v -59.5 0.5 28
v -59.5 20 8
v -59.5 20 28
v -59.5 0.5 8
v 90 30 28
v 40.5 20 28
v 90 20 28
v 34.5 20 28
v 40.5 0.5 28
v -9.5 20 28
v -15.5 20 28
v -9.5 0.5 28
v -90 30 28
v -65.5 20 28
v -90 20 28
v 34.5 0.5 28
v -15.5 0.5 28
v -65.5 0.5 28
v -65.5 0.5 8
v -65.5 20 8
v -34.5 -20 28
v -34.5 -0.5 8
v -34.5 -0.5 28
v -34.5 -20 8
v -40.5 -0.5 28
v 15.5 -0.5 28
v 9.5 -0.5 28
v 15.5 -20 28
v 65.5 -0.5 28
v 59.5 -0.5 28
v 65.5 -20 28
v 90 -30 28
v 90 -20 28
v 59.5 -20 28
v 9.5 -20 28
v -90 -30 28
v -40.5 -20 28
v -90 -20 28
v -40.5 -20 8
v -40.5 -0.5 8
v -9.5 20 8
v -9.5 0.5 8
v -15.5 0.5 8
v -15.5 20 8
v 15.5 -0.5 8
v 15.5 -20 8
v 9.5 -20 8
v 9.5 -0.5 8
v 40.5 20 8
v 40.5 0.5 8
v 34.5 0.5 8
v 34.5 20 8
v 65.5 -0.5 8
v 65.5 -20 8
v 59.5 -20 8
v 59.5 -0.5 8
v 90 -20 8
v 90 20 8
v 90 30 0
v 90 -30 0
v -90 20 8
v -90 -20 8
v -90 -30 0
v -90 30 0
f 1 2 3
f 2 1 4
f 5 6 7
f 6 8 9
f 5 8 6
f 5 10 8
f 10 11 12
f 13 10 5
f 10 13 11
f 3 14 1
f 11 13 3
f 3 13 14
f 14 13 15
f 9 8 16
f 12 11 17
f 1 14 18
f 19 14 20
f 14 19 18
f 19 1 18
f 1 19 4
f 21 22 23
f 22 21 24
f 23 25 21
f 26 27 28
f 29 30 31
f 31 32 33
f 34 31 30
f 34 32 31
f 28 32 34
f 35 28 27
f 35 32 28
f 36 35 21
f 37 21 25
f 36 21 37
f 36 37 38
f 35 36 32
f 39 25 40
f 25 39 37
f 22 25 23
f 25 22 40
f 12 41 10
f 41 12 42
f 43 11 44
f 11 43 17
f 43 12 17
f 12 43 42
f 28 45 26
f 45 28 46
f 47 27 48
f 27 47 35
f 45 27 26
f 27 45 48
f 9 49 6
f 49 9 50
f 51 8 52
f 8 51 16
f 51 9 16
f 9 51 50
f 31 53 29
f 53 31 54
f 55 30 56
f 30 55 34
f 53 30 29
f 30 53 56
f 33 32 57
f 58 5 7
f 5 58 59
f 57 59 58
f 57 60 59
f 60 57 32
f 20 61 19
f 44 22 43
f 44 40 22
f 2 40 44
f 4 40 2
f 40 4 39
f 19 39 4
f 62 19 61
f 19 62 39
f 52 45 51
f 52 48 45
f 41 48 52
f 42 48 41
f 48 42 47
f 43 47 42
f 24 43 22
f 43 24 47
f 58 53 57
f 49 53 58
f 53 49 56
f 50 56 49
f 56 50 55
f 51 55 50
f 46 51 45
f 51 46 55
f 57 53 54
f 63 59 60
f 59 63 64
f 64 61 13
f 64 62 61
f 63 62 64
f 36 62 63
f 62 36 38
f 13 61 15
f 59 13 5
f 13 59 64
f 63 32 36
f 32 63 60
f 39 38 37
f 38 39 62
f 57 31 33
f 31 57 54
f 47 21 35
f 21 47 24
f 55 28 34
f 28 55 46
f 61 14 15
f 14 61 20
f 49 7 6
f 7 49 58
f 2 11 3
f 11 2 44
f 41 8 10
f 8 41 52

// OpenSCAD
$fn = 32;

// ----------------------------------------------------------------------
// Rib frame 180 x 60 x 28
// 6 ribs at 25 mm pitch, staggered
// ----------------------------------------------------------------------

// --- parameters (mm) ---
frame = [180, 60, 8];  // base plate size (x, y, z)
seat_tol = 0.1;        // tolerance at the seating features
free_tol = 0.3;        // general tolerance on the free sizes
rail_w = 10;           // side rail width
ribs = 6;              // number of ribs
rib_t = 6;             // rib thickness
rib_h = 20;            // rib height above the base plate
pitch = 25;            // pitch between rib centres

// --- derived feature positions (mm) ---
span = (ribs - 1) * pitch;          // = 125   distance between the outer ribs
origin_x = -span / 2;               // = -62.5   X of the first rib
rib_len = frame[1] / 2 - rail_w + 0.5;  // = 20.5   length of a staggered rib
rib_y = 0.5 + rib_len / 2;          // = 10.75   Y of a staggered rib centre
row_offset = 2 * rib_y;             // = 21.5   distance between the two rows
feature_centers = [
  [origin_x + 0 * pitch, rib_y],
  [origin_x + 1 * pitch, -rib_y],
  [origin_x + 2 * pitch, rib_y],
  [origin_x + 3 * pitch, -rib_y],
  [origin_x + 4 * pitch, rib_y],
  [origin_x + 5 * pitch, -rib_y]
];   // rib centre line, drives the rib loop

// base plate, two side rails, then the ribs read straight off feature_centers
union() {
  translate([-frame[0] / 2, -frame[1] / 2, 0]) cube(frame);
  translate([-frame[0] / 2, -frame[1] / 2, 0]) cube([frame[0], rail_w, frame[2] + rib_h]);
  translate([-frame[0] / 2, frame[1] / 2 - rail_w, 0]) cube([frame[0], rail_w, frame[2] + rib_h]);
  for (centre = feature_centers)
    translate([centre[0] - rib_t / 2, centre[1] - rib_len / 2, frame[2] - 1])
      cube([rib_t, rib_len, rib_h + 1]);
}
